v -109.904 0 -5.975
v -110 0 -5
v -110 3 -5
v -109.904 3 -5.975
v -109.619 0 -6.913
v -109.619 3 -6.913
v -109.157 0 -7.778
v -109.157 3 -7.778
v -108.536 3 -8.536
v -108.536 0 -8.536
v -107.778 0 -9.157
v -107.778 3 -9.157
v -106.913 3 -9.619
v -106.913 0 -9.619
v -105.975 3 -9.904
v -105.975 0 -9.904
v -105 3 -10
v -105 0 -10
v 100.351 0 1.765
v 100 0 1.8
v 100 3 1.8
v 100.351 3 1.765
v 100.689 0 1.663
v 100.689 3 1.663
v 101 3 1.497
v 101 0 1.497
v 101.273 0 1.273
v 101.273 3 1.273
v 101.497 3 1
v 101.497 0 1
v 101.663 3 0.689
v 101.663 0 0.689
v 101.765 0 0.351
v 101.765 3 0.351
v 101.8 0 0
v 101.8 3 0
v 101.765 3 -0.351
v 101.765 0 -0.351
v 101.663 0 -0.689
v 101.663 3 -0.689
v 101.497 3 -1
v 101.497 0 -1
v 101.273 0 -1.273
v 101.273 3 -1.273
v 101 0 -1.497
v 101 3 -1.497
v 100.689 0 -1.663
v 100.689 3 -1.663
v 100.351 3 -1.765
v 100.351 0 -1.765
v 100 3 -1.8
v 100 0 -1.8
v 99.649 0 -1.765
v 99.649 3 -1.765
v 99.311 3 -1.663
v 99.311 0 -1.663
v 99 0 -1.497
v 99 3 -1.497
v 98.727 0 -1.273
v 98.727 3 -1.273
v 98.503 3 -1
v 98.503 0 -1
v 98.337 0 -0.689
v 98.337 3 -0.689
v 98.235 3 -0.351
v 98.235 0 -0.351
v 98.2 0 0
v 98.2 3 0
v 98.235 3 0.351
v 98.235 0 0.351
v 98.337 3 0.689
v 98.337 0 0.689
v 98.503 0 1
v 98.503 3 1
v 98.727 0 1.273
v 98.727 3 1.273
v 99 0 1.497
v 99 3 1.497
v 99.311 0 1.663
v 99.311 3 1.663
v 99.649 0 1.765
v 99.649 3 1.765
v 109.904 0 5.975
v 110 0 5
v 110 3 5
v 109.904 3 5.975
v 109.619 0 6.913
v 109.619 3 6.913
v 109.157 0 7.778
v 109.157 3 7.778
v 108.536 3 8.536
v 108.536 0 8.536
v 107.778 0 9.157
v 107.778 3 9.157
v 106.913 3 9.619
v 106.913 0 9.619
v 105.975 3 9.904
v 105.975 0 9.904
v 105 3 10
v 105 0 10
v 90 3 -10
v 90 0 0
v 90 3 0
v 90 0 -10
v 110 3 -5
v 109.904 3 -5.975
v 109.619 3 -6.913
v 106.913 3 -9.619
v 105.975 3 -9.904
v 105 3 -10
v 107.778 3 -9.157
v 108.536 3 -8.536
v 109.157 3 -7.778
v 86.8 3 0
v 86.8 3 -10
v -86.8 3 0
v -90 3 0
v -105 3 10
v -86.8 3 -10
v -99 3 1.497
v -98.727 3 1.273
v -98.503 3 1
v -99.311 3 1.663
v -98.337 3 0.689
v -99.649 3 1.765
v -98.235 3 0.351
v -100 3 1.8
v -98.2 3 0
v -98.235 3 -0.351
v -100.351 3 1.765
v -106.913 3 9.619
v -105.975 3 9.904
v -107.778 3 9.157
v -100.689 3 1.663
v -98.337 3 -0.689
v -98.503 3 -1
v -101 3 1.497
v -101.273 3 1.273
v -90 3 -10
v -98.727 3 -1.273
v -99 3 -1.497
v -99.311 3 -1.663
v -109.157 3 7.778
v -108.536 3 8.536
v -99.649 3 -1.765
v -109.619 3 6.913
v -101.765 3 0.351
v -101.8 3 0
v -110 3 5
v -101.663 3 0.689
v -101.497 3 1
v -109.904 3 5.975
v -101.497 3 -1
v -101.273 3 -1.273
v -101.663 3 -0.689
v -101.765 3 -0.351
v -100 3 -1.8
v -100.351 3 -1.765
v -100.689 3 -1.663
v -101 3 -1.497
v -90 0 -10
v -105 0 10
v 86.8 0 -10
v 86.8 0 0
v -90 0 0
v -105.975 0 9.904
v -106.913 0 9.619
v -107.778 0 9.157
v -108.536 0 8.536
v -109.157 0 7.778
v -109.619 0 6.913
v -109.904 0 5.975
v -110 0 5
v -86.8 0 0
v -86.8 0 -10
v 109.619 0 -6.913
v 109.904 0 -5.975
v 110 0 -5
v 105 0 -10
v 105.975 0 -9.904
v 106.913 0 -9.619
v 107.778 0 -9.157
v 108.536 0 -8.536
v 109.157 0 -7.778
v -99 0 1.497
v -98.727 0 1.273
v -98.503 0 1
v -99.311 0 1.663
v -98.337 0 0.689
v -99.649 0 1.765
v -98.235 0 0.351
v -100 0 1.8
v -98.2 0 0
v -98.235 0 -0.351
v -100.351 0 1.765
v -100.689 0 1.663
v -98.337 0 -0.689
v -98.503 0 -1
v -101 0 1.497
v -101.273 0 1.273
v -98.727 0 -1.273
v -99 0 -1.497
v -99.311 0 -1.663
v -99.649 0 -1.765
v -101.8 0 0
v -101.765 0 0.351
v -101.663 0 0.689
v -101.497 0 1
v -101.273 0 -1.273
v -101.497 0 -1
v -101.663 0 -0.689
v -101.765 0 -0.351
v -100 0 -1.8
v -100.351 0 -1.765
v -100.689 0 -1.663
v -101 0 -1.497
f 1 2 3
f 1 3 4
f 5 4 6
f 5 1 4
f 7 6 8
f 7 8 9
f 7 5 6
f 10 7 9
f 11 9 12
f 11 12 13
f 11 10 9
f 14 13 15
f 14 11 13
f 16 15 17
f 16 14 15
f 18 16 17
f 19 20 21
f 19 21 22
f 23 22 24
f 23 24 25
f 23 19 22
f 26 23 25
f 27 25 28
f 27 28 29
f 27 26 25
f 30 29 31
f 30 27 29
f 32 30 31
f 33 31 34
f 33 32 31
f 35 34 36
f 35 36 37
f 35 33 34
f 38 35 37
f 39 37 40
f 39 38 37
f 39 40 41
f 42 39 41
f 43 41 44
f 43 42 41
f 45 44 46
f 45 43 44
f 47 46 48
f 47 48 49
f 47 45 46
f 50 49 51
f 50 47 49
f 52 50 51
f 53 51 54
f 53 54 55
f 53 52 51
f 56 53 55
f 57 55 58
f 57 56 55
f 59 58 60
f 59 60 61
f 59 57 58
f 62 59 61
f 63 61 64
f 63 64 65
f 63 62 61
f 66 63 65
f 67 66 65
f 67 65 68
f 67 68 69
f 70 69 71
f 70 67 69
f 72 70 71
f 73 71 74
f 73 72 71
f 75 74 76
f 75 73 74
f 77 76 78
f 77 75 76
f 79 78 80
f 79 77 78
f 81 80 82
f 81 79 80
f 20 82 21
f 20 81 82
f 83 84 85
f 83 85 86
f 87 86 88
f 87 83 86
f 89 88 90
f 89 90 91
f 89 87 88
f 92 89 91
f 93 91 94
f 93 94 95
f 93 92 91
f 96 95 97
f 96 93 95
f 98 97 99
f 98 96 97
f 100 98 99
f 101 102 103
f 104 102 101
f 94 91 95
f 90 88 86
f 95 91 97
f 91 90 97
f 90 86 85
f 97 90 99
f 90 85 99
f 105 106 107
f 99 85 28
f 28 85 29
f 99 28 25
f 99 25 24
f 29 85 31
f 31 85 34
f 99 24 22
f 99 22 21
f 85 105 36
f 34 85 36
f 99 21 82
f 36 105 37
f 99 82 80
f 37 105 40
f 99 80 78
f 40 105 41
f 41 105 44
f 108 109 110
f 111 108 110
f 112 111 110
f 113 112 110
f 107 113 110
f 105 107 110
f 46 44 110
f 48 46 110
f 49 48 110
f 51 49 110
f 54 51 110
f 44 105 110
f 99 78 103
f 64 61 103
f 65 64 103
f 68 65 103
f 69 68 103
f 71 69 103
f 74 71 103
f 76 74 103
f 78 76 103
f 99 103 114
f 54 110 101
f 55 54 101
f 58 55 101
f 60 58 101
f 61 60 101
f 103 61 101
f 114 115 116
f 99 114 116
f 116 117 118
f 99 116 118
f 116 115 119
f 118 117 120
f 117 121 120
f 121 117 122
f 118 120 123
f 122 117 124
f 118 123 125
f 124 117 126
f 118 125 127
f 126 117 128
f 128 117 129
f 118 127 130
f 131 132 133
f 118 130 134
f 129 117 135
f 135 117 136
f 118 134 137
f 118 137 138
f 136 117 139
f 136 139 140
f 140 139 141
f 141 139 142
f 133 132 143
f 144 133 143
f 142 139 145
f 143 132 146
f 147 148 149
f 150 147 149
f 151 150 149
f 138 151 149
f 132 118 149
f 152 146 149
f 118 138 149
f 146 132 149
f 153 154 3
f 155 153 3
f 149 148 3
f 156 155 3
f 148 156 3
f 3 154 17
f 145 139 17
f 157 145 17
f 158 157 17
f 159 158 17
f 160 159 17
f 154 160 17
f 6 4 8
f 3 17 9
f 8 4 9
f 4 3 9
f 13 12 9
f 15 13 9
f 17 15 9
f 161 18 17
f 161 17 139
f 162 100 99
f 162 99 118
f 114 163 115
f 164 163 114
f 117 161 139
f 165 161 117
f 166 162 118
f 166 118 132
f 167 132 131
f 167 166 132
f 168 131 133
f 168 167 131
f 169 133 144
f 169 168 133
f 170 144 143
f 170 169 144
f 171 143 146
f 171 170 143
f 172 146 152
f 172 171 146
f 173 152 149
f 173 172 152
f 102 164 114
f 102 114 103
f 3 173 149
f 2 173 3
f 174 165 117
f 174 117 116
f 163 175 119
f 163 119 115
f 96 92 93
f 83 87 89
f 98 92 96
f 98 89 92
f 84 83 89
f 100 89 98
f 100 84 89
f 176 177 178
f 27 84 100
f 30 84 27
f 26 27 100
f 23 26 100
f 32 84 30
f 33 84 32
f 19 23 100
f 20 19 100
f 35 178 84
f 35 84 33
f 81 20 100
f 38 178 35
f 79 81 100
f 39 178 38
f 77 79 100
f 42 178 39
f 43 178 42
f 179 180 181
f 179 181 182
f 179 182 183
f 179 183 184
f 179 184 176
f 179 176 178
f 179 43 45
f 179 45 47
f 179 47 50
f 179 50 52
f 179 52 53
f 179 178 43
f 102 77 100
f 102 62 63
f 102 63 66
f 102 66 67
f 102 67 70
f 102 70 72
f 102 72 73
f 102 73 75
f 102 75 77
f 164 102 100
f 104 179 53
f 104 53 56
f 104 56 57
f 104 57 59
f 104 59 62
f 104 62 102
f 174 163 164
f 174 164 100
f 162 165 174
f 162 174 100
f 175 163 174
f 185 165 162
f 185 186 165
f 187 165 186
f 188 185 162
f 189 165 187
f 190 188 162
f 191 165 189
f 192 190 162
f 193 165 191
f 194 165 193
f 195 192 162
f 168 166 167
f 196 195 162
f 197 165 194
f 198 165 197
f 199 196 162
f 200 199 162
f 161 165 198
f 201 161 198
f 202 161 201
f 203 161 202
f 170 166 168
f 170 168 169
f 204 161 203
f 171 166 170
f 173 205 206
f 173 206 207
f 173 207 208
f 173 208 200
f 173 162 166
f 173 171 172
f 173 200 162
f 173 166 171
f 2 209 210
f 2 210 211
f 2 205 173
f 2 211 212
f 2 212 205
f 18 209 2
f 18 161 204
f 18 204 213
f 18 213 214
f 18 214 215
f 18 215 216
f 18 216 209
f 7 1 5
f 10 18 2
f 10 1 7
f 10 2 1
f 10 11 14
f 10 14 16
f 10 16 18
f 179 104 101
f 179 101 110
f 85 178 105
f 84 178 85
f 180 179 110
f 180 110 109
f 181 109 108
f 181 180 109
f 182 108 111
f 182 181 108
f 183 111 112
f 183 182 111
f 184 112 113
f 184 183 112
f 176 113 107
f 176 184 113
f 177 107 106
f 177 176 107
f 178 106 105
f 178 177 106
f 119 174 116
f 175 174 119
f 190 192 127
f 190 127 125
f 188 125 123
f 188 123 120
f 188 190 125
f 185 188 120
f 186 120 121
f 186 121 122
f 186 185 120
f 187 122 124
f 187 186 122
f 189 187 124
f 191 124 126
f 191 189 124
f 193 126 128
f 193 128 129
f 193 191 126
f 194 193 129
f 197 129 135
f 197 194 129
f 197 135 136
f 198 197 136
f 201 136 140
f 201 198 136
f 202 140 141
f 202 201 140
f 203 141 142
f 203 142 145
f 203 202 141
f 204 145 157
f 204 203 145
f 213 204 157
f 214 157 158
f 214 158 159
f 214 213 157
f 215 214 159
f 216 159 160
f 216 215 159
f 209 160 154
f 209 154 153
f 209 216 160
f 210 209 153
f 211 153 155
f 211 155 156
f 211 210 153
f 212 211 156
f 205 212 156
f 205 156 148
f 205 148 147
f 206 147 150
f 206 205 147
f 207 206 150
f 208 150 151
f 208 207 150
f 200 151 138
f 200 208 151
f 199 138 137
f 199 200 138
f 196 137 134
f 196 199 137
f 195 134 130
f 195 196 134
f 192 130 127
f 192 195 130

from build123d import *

# Parameters (mm, degrees)
SKETCH_1_R      = 1.8
EXTRUDE_1_DEPTH = 3


with BuildPart() as part:
    # 草图1 → 凸台-拉伸1 (new body)
    with BuildSketch(Plane(origin=(0, 0, 0), x_dir=(1, 0, 0), z_dir=(0, 1, 0))):
        with BuildLine():
            Line((-90, 10), (-90, 0))
            Line((-90, 0), (-86.8, 0))
            Line((-86.8, 0), (-86.8, 10))
            Line((-86.8, 10), (86.8, 10))
            Line((86.8, 10), (86.8, 0))
            Line((86.8, 0), (90, 0))
            Line((90, 0), (90, 10))
            Line((90, 10), (105, 10))
            ThreePointArc((105, 10), (108.535533906, 8.535533906), (110, 5))
            Line((110, 5), (110, -5))
            ThreePointArc((110, -5), (108.535533906, -8.535533906), (105, -10))
            Line((105, -10), (-105, -10))
            ThreePointArc((-105, -10), (-108.535533906, -8.535533906), (-110, -5))
            Line((-110, -5), (-110, 5))
            ThreePointArc((-110, 5), (-108.535533906, 8.535533906), (-105, 10))
            Line((-105, 10), (-90, 10))
        make_face()
        with Locations(Location((-100, 0, 0), (0, 0, 270))):
            Circle(SKETCH_1_R, mode=Mode.SUBTRACT)
        with Locations(Location((100, 0, 0), (0, 0, 270))):
            Circle(SKETCH_1_R, mode=Mode.SUBTRACT)
    extrude(amount=EXTRUDE_1_DEPTH)


solid = part.part
